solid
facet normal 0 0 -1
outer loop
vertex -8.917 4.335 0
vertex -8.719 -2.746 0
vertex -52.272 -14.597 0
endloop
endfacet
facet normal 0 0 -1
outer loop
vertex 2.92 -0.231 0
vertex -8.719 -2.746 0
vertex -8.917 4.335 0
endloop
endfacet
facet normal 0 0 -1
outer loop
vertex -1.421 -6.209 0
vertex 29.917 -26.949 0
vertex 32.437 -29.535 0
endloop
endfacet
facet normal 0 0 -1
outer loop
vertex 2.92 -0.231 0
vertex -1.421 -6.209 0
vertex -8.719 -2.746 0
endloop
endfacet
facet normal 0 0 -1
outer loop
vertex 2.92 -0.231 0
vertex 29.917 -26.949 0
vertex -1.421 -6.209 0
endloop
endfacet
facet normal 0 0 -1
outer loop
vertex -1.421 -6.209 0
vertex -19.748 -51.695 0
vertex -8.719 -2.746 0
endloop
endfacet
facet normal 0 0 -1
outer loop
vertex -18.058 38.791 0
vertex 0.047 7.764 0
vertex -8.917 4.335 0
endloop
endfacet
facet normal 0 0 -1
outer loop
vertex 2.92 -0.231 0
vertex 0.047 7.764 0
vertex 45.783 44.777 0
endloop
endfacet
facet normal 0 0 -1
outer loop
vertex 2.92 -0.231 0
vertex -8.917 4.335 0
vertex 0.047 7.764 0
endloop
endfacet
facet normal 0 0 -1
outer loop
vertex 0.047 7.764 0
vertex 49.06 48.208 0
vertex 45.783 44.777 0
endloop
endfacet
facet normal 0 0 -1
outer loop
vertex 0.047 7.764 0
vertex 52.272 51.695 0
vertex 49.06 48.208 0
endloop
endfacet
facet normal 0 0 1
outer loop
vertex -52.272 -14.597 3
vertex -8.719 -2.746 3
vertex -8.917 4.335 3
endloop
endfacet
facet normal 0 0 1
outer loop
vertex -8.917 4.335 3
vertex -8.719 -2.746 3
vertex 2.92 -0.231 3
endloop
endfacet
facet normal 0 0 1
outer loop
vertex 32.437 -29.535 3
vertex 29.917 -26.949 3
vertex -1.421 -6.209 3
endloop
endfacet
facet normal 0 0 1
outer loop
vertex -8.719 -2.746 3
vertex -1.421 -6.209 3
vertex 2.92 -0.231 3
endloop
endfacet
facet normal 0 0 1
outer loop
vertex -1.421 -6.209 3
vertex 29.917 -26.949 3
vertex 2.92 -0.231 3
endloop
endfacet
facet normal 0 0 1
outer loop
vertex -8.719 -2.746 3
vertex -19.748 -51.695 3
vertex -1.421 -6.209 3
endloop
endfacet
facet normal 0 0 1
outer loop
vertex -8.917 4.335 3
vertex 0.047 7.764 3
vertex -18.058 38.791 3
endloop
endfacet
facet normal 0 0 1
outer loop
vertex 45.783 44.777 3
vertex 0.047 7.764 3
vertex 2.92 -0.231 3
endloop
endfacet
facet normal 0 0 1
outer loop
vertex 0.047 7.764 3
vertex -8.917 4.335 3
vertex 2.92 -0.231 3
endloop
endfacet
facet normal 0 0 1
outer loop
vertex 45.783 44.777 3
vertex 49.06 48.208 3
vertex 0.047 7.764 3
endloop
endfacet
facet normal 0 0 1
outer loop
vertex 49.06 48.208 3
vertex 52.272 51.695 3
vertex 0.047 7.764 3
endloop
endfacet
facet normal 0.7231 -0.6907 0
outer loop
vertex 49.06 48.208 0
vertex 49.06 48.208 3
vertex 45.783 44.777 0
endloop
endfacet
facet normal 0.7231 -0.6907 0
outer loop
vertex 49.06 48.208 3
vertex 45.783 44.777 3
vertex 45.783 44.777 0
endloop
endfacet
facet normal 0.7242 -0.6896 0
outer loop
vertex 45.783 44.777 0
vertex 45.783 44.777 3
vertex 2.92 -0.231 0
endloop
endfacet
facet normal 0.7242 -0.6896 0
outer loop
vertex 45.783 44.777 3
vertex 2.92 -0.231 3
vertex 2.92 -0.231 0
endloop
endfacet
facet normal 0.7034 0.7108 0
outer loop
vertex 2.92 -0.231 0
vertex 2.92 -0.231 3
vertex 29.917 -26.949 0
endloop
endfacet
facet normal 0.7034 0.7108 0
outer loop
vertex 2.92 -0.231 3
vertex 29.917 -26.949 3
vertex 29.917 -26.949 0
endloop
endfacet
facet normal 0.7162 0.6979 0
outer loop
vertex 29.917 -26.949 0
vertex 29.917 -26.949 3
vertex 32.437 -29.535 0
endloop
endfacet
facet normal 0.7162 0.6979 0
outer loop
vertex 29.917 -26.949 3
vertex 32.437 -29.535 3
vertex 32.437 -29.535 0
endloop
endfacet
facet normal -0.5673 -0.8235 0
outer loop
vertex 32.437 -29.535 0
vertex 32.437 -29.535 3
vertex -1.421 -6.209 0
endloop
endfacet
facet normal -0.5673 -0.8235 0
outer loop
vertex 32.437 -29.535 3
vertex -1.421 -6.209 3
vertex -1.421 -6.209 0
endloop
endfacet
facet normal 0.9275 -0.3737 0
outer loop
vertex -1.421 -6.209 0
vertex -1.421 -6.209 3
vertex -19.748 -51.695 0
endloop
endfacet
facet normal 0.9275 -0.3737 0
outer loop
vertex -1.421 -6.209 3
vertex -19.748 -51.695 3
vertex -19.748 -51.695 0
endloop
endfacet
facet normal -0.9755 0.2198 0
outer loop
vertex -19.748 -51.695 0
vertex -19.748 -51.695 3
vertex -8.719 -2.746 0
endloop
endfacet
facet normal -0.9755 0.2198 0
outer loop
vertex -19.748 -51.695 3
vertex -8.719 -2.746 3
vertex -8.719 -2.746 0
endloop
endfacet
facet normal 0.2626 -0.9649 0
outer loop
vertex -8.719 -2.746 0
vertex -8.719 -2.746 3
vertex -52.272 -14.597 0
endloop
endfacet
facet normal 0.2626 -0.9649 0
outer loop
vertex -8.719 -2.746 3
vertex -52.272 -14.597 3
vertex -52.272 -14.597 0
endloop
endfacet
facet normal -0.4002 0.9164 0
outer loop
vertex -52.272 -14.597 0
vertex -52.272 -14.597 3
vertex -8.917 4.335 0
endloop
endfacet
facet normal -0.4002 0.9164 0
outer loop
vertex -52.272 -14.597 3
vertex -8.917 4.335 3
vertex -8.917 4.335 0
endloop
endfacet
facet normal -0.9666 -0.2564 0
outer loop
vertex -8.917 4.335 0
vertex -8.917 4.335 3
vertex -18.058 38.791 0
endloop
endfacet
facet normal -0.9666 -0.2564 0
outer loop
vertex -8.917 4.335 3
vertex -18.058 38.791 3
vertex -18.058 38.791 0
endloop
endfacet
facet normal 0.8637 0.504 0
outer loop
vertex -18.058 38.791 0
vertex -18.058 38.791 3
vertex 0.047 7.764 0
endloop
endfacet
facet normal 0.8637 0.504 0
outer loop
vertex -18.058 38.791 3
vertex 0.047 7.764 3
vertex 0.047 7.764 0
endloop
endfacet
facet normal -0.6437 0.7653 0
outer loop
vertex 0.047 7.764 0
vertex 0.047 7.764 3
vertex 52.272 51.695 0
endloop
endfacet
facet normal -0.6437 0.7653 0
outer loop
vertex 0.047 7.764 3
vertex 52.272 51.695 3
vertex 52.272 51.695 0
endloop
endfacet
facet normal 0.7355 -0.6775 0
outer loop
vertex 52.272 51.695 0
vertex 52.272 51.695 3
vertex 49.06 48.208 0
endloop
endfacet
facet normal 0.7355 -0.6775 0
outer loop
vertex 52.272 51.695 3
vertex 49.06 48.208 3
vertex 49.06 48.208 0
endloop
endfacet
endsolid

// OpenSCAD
// Module names are of the form poly_<inkscape-path-id>().  As a result,
// you can associate a polygon in this OpenSCAD program with the corresponding
// SVG element in the Inkscape document by looking for the XML element with
// the attribute id="inkscape-path-id".

// fudge value is used to ensure that subtracted solids are a tad taller
// in the z dimension than the polygon being subtracted from.  This helps
// keep the resulting .stl file manifold.
fudge = 0.1;

module poly_path8(h)
{
  scale([25.4/90, -25.4/90, 1]) union()
  {
    linear_extrude(height=h)
      polygon([[0.165000,-27.510000],[185.215000,-183.170000],[173.836250,-170.817500],[162.225000,-158.660000],[10.345000,0.820000],[106.005000,95.490000],[114.935000,104.650000],[-5.035000,22.000000],[-69.975000,183.170000],[-30.895000,9.730000],[-185.215000,51.720000],[-31.595000,-15.360000],[-63.985000,-137.450000],[0.165000,-27.510000]]);
  }
}

poly_path8(3);
